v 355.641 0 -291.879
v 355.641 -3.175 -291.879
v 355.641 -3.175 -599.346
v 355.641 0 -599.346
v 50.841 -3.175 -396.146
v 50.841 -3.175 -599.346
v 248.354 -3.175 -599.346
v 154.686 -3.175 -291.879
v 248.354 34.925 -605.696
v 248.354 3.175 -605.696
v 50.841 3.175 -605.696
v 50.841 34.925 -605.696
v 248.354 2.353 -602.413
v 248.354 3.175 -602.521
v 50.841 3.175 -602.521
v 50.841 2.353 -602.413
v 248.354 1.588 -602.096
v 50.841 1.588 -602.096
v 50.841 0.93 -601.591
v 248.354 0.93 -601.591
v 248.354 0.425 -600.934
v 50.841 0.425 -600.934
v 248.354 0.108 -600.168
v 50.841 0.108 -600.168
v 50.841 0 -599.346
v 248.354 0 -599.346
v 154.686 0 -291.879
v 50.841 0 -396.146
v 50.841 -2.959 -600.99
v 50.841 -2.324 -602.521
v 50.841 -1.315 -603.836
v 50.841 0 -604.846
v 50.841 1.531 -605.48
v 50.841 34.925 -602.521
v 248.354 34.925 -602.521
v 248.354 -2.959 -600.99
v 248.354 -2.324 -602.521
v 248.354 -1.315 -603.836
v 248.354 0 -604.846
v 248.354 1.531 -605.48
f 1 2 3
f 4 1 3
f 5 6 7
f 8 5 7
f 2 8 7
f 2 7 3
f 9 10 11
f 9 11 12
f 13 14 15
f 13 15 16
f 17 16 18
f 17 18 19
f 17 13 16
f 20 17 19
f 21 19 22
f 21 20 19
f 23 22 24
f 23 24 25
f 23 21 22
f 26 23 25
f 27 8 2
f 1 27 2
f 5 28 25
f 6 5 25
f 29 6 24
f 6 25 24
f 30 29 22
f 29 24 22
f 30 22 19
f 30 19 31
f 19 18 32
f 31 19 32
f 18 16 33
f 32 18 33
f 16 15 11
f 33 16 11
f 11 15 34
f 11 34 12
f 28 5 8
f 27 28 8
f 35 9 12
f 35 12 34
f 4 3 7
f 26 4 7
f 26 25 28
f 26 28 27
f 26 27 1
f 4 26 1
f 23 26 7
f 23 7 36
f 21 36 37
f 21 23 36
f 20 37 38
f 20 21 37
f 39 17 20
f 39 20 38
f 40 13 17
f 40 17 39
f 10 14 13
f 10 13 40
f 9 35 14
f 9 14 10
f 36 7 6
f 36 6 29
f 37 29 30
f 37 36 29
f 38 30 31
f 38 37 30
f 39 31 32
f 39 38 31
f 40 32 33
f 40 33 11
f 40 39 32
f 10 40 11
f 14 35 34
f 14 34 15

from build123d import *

# Parameters (mm, degrees)
BASE_FLANGE1_START = -3.175
BASE_FLANGE1_DEPTH = 3.175
EDGE_FLANGE1_DEPTH = 197.512880056


# Read off the part's stored shape, not the designer's step: Base-Flange1
# Sheet-metal steps are written as plain solids
with BuildPart() as part:
    # Base-Flange1 outline → Base-Flange1 (new body)
    with BuildSketch(Plane(origin=(0, 0, 0), x_dir=(1, 0, 0), z_dir=(0, 1, 0)).offset(BASE_FLANGE1_START)):
        Polygon((50.84064, 599.346330946), (50.84064, 396.146330946), (154.686, 291.879330946), (355.64064, 291.879330946), (355.64064, 599.346330946), align=None)
    extrude(amount=BASE_FLANGE1_DEPTH)

    # Edge-Flange1 section (across the edge) → Edge-Flange1 (add)
    with BuildSketch(Plane(origin=(248.353520056, 0, -602.521330946), x_dir=(0, 0, 1), z_dir=(-1, 0, 0))):
        with BuildLine():
            Line((-3.175, 3.175), (-3.175, 34.925))
            Line((-3.175, 34.925), (0, 34.925))
            Line((0, 34.925), (0, 3.175))
            ThreePointArc((0, 3.175), (0.92993597, 0.92993597), (3.175, 0))
            Line((3.175, 0), (3.175, -3.175))
            ThreePointArc((3.175, -3.175), (-1.315128061, -1.315128061), (-3.175, 3.175))
        make_face()
    extrude(amount=EDGE_FLANGE1_DEPTH)


solid = part.part
